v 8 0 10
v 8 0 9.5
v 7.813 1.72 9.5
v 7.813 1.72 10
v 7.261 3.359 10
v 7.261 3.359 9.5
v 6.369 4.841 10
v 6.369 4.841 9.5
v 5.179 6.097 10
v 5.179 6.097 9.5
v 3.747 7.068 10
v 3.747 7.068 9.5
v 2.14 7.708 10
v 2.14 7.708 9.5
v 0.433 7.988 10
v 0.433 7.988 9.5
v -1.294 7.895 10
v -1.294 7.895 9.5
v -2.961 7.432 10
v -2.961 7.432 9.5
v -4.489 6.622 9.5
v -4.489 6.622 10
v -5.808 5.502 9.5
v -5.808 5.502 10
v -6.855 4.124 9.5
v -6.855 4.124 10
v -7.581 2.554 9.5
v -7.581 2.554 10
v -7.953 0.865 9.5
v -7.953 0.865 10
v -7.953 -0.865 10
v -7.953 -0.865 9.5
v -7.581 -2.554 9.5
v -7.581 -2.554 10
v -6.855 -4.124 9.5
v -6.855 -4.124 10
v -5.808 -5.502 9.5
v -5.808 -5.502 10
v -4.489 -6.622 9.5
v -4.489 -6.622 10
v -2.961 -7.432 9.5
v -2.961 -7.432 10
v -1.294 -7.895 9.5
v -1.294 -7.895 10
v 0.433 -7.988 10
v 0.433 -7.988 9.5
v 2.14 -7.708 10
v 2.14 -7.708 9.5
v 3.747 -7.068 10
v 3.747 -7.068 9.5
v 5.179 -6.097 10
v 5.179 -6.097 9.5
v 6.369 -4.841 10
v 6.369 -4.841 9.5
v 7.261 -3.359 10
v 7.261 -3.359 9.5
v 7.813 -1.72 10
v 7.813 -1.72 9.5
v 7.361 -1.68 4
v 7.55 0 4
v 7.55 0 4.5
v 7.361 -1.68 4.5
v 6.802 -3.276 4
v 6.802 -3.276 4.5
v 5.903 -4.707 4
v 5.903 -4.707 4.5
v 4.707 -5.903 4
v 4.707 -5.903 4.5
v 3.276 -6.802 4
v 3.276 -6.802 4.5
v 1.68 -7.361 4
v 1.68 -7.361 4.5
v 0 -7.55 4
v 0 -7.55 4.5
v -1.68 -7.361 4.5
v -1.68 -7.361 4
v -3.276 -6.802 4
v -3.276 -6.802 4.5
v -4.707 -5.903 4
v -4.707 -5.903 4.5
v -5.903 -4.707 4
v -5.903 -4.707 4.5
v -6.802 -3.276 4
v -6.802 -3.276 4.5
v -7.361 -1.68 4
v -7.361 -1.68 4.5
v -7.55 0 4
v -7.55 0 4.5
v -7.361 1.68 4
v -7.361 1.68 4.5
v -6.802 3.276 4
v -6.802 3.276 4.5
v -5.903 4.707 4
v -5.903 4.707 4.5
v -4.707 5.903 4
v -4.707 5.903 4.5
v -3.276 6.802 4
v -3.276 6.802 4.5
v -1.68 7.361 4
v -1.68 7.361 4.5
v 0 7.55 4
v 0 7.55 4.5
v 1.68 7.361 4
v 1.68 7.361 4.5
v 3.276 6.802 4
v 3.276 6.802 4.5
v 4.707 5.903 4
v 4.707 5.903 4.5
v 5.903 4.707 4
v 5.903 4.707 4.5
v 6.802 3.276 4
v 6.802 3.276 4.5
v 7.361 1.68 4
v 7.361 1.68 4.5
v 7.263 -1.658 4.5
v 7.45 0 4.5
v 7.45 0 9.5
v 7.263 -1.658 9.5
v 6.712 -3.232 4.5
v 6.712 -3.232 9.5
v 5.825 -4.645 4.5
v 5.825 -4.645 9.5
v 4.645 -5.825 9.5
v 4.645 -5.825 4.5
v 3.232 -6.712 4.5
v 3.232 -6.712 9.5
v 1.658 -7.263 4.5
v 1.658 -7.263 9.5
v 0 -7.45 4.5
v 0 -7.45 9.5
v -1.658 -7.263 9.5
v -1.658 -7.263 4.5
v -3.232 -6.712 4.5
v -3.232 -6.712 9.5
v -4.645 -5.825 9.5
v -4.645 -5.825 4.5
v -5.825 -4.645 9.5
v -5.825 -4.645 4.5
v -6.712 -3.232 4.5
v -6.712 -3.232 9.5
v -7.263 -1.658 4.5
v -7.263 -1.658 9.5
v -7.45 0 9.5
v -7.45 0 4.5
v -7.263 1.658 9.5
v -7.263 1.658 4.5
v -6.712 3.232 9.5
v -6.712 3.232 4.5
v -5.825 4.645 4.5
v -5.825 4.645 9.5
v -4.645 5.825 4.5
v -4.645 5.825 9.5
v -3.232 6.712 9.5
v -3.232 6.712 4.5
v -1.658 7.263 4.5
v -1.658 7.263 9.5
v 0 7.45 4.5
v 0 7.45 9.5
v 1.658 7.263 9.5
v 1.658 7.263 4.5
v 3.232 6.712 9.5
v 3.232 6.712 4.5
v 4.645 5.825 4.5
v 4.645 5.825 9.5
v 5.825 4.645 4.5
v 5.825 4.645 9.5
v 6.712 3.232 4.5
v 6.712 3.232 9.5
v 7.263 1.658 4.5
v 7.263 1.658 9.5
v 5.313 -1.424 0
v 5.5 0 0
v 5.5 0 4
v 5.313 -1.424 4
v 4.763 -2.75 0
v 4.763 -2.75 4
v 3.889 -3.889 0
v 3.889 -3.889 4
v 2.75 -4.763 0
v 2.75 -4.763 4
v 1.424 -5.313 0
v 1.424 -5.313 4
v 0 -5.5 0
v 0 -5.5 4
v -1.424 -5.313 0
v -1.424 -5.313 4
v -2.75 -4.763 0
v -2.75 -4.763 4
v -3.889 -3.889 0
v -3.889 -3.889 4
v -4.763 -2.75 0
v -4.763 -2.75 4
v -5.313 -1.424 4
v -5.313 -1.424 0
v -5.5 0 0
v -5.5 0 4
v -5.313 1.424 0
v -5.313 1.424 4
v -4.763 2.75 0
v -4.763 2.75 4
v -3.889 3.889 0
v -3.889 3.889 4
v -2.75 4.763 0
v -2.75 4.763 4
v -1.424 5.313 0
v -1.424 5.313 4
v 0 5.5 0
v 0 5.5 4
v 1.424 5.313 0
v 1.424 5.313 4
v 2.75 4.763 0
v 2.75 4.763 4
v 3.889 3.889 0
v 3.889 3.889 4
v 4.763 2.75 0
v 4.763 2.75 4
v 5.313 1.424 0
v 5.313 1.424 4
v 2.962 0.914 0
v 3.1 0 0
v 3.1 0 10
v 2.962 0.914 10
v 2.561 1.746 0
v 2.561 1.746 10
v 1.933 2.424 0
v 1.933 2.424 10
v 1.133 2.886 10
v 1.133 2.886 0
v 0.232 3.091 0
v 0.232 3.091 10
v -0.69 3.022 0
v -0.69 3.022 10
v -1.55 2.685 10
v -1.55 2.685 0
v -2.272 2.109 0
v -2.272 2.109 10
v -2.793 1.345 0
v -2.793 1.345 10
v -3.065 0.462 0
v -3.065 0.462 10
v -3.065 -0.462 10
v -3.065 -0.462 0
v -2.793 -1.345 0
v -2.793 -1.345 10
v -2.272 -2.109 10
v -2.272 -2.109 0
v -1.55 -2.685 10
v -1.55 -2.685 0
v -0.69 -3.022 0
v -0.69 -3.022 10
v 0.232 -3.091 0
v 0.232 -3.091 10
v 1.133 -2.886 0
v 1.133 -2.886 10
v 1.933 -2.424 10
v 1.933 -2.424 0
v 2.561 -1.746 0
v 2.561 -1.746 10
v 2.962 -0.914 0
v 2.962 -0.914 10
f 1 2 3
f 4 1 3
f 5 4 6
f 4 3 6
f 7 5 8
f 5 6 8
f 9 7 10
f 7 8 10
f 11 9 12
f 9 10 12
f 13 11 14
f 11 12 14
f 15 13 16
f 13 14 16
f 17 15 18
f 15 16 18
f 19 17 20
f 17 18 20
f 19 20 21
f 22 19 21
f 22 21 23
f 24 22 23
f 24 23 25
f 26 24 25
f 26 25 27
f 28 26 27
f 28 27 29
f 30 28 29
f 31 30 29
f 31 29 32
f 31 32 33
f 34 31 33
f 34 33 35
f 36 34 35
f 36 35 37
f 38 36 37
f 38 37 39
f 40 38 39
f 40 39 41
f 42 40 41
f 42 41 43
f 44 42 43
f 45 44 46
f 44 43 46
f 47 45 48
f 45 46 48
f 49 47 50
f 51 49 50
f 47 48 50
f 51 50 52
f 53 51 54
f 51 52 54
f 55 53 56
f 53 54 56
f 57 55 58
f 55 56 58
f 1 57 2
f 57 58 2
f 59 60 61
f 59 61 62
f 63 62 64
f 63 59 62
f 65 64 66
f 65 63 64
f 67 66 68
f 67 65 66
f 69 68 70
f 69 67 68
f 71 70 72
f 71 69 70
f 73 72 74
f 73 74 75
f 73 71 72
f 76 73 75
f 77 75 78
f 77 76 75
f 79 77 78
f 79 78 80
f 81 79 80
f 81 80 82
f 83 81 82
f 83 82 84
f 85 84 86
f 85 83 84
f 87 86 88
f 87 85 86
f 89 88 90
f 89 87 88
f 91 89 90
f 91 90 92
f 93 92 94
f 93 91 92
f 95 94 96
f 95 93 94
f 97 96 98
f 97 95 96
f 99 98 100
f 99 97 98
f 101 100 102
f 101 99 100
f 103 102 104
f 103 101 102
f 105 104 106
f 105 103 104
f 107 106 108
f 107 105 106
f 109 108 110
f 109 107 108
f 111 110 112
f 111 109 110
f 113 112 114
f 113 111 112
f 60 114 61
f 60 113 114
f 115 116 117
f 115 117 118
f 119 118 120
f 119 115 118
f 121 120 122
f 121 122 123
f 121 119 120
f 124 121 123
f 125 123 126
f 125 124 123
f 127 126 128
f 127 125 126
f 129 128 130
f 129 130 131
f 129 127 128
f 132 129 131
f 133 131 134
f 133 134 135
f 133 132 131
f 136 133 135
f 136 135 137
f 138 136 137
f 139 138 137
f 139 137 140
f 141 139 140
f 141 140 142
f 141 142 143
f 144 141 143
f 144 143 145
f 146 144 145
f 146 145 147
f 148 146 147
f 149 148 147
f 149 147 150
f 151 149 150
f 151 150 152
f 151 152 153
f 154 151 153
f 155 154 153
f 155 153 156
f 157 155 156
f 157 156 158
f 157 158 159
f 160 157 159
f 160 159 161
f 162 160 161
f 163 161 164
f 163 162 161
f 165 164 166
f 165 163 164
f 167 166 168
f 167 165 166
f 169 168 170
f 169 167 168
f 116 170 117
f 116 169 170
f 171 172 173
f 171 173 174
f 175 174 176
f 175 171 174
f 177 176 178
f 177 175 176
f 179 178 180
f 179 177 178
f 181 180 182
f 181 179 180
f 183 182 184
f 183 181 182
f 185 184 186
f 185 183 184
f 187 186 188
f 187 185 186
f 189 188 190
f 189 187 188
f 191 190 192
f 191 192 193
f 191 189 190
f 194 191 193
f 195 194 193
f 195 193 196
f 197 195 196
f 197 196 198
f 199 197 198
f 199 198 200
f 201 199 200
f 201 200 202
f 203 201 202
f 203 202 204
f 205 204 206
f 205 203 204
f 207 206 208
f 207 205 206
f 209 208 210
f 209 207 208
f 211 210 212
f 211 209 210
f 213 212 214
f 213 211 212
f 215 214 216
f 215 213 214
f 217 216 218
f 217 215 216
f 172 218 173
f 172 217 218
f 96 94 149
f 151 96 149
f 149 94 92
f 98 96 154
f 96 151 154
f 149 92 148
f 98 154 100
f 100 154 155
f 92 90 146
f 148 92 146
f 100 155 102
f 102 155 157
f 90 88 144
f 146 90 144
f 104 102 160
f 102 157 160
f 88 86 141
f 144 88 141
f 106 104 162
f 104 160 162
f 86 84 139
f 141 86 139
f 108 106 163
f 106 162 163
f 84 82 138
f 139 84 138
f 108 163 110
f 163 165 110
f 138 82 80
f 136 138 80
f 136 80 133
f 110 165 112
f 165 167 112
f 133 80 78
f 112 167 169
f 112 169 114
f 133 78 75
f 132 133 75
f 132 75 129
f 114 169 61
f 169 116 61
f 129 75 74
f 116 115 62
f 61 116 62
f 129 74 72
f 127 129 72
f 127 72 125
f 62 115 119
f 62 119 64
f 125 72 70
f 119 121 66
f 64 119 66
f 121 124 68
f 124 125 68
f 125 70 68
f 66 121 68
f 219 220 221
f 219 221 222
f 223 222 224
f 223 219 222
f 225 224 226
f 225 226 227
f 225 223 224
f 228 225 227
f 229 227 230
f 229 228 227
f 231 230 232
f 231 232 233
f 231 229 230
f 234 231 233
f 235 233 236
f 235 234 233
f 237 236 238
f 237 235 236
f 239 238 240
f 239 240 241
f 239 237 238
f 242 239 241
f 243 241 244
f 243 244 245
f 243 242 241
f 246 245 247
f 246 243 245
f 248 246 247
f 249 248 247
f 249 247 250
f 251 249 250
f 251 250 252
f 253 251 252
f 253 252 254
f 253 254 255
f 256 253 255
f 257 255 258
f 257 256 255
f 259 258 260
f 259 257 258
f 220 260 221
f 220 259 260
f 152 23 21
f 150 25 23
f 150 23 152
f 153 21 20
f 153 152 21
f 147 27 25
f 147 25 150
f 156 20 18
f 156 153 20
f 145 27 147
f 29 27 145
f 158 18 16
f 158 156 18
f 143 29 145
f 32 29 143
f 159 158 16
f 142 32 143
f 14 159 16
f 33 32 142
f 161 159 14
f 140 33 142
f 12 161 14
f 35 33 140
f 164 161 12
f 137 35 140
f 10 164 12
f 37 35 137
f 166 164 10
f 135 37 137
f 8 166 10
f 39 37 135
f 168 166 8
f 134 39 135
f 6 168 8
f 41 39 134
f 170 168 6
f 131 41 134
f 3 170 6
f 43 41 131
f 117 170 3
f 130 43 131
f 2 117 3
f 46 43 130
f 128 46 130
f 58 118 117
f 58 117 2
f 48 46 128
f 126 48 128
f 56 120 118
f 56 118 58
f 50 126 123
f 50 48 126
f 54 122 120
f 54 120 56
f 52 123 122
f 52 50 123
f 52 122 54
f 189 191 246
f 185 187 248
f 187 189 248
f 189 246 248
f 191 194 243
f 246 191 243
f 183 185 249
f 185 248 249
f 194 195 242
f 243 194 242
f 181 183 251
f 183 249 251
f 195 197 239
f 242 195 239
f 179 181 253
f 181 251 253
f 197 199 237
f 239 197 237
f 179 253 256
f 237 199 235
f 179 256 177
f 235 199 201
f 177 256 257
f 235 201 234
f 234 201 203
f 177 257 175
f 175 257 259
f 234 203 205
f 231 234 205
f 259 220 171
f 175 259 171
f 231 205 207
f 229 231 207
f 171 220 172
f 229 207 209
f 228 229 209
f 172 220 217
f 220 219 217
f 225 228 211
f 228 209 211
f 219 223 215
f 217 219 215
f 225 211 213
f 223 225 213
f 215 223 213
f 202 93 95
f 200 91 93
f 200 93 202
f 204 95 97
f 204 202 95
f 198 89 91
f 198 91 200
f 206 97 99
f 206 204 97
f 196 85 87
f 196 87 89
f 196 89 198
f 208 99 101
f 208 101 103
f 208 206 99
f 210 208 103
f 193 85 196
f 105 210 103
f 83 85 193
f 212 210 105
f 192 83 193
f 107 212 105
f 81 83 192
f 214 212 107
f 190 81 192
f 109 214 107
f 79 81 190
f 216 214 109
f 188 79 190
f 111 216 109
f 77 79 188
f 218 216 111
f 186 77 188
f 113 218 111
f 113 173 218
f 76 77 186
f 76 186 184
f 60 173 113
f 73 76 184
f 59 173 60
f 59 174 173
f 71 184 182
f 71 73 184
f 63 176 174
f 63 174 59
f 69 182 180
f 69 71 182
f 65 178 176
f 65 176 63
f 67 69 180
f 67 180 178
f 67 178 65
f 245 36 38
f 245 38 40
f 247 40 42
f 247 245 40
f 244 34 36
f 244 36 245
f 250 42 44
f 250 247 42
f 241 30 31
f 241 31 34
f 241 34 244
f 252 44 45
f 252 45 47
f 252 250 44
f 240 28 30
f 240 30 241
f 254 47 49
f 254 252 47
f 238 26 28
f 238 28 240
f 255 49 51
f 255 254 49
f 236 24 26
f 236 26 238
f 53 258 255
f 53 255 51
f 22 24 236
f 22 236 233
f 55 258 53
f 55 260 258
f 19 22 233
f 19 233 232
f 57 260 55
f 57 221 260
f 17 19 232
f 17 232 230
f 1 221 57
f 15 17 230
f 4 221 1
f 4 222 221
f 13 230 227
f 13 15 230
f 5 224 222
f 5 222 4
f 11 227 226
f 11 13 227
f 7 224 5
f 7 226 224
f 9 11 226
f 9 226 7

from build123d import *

# Parameters (mm, degrees)
SKETCH_R        = 8
SKETCH_R_2      = 3.1
PAD_DEPTH       = 10
SKETCH001_R     = 15.500543
SKETCH001_R_2   = 7.45
POCKET_DEPTH    = 9.5
SKETCH002_R     = 11.210936
SKETCH002_R_2   = 5.5
POCKET001_DEPTH = 4
SKETCH003_R     = 7.55
SKETCH003_R_2   = 6.749921
PAD001_DEPTH    = 0.5


with BuildPart() as part:
    # Sketch → Pad (new body)
    with BuildSketch(Plane.XY):
        Circle(SKETCH_R)
        Circle(SKETCH_R_2, mode=Mode.SUBTRACT)
    extrude(amount=PAD_DEPTH)

    # Sketch001 (on Face3 of Pad) → Pocket (cut)
    with BuildSketch(Plane(origin=(0, 0, 0), x_dir=(1, 0, 0), z_dir=(0, 0, -1))):
        Circle(SKETCH001_R)
        Circle(SKETCH001_R_2, mode=Mode.SUBTRACT)
    extrude(amount=-POCKET_DEPTH, mode=Mode.SUBTRACT)

    # Sketch002 (on Face6 of Pocket) → Pocket001 (cut)
    with BuildSketch(Plane(origin=(0, 0, 0), x_dir=(1, 0, 0), z_dir=(0, 0, -1))):
        Circle(SKETCH002_R)
        Circle(SKETCH002_R_2, mode=Mode.SUBTRACT)
    extrude(amount=-POCKET001_DEPTH, mode=Mode.SUBTRACT)

    # Sketch003 (on Face6 of Pocket001) → Pad001 (join)
    with BuildSketch(Plane(origin=(0, 0, 4), x_dir=(1, 0, 0), z_dir=(0, 0, -1))):
        Circle(SKETCH003_R)
        Circle(SKETCH003_R_2, mode=Mode.SUBTRACT)
    extrude(amount=-PAD001_DEPTH)


solid = part.part
